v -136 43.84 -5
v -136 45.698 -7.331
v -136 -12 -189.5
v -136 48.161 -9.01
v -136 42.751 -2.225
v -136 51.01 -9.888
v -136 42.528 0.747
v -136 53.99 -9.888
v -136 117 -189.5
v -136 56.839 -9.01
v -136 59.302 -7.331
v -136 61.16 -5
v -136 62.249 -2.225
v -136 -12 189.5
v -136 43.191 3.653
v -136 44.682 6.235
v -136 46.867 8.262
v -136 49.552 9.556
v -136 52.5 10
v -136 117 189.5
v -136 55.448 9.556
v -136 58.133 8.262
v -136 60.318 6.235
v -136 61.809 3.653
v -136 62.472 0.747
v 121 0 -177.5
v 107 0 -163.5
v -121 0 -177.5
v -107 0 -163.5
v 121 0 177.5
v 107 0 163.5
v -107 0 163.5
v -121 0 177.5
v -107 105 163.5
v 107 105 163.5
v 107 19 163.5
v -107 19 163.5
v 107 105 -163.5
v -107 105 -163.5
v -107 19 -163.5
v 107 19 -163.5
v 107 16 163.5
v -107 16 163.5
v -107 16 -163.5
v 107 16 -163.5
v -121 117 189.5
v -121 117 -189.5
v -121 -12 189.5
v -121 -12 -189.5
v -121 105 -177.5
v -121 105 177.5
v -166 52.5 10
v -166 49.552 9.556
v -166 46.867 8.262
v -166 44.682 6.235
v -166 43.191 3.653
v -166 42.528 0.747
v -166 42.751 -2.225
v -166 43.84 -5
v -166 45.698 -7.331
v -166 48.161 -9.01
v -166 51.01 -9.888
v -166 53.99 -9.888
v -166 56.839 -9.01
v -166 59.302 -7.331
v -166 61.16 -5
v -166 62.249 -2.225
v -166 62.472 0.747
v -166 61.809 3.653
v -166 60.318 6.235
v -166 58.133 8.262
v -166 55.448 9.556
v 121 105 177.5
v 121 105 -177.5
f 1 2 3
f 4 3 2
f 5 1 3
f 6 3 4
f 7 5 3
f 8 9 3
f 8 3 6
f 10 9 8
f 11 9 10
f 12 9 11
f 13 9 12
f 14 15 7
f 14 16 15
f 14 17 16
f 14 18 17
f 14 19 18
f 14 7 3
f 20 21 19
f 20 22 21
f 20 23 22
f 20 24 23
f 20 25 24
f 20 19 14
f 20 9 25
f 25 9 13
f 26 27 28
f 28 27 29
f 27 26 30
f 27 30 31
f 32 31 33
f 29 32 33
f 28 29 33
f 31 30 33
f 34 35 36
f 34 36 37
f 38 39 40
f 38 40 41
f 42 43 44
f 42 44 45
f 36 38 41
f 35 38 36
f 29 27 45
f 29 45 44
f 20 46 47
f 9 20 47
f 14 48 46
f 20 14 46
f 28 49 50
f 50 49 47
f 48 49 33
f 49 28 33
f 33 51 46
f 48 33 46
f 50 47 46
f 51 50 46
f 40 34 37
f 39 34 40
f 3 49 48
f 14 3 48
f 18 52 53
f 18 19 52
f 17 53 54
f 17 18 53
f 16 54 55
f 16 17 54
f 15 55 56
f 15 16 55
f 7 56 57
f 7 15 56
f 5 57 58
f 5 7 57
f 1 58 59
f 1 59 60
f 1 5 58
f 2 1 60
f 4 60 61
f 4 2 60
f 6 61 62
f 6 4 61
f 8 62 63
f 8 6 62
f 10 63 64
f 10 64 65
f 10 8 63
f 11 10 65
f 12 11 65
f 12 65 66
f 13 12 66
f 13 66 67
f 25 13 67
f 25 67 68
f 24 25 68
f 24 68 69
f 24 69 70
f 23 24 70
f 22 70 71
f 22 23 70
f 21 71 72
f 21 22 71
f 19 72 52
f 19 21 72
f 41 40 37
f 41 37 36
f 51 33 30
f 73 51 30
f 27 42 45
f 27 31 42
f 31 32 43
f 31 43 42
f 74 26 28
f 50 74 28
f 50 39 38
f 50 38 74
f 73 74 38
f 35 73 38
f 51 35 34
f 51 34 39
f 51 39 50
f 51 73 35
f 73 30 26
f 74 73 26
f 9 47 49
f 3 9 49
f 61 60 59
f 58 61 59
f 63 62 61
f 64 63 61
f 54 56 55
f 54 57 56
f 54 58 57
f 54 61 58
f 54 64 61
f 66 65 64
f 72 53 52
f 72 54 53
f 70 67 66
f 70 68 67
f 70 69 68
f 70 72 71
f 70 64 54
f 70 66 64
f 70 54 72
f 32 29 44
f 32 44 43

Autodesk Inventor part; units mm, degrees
ref_plane "YZ Plane" through (0, 0, 0) normal (1, 0, 0) x (0, 1, 0)
ref_plane "XZ Plane" through (0, 0, 0) normal (0, 1, 0) x (-1, 0, 0)
ref_plane "XY Plane" through (0, 0, 0) normal (0, 0, 1) x (1, 0, 0)
sketch "Boceto1" plane through (0, 0, 0) normal (0, 1, 0) x (-1, 0, 0)
  line L0 (-121, -177.5) -> (121, -177.5)
  line L1 (121, -177.5) -> (121, 177.5)
  line L2 (121, 177.5) -> (-121, 177.5)
  line L3 (-121, 177.5) -> (-121, -177.5)
  line L4 (-121, -177.5) -> (121, 177.5) construction
  line L5 (121, -177.5) -> (-121, 177.5) construction
  point P0 (0, 0)
  dimension "d0" = 242
  dimension "d1" = 355
extrude "Extrusión1" add sketch "Boceto1" along normal blind 105
sketch "Boceto2" plane through (0, 105, 0) normal (0, 1, 0) x (1, 0, 0)
  line L0 (-121, 177.5) -> (-121, -177.5) projected
  line L1 (-121, -177.5) -> (121, -177.5) projected
  line L2 (121, -177.5) -> (121, 177.5) projected
  line L3 (121, 177.5) -> (-121, 177.5) projected
  line L4 (107, -163.5) -> (-107, -163.5)
  line L5 (-107, -163.5) -> (-107, 163.5)
  line L6 (-107, 163.5) -> (107, 163.5)
  line L7 (107, 163.5) -> (107, -163.5)
  point P0 (0, 0)
  dimension "d4" = 14
extrude "Extrusión2" cut sketch "Boceto2" against normal blind 86 contours L4 L5 L6 L7
sketch "Boceto3" plane through (0, 0, 0) normal (0, -1, 0) x (1, 0, 0)
  line L0 (-121, -177.5) -> (-121, 177.5) projected
  line L1 (121, -177.5) -> (-121, -177.5) projected
  line L2 (121, 177.5) -> (121, -177.5) projected
  line L3 (-121, 177.5) -> (121, 177.5) projected
  line L4 (107, 163.5) -> (107, -163.5)
  line L5 (107, -163.5) -> (-107, -163.5)
  line L6 (-107, -163.5) -> (-107, 163.5)
  line L7 (-107, 163.5) -> (107, 163.5)
  point P0 (0, 0)
  dimension "d7" = 14
extrude "Extrusión3" cut sketch "Boceto3" against normal blind 16 contours L4 L5 L6 L7
sketch "Boceto4" plane through (-121, 0, -177.5) normal (-1, 0, 0) x (0, 0, 1)
  line L0 (0, 0) -> (355, 0) projected
  line L1 (355, 0) -> (355, 105) projected
  line L2 (0, 105) -> (355, 105) projected
  line L3 (0, 0) -> (0, 105) projected
  line L4 (355, 105) -> (355, 117)
  line L5 (355, 105) -> (367, 105) construction
  line L6 (355, 117) -> (367, 117)
  line L7 (0, 0) -> (-12, 0)
  line L8 (-12, 0) -> (-12, -12)
  line L9 (-12, -12) -> (367, -12)
  line L10 (367, -12) -> (367, 117)
  line L11 (367, 117) -> (-12, 117)
  line L12 (-12, 117) -> (-12, -12)
  point P0 (177.5, 0)
  point P1 (-12, 0)
  dimension "d10" = 12
  dimension "d11" = 90
  dimension "d12" = 12
  dimension "d13" = 90
  dimension "d14" = 12
  dimension "d15" = 12
  dimension "d16" = 90
extrude "Extrusión4" add sketch "Boceto4" along normal blind 15
sketch "Boceto5" plane through (-136, 0, -177.5) normal (-1, 0, 0) x (0, 0, 1)
  line L0 (-12, 117) -> (-12, -12) projected
  line L1 (-12, -12) -> (367, -12) projected
  line L2 (367, -12) -> (367, 117) projected
  line L3 (367, 117) -> (-12, 117) projected
  line L4 (-12, -12) -> (367, 117)
  circle A0 centre (177.5, 52.5) radius 10
  point P0 (177.5, 0)
  dimension "d19" = 20
extrude "Extrusión5" add sketch "Boceto5" along normal blind 30 contours A0 L4 | L4 A0
properties part number "Cajon"
